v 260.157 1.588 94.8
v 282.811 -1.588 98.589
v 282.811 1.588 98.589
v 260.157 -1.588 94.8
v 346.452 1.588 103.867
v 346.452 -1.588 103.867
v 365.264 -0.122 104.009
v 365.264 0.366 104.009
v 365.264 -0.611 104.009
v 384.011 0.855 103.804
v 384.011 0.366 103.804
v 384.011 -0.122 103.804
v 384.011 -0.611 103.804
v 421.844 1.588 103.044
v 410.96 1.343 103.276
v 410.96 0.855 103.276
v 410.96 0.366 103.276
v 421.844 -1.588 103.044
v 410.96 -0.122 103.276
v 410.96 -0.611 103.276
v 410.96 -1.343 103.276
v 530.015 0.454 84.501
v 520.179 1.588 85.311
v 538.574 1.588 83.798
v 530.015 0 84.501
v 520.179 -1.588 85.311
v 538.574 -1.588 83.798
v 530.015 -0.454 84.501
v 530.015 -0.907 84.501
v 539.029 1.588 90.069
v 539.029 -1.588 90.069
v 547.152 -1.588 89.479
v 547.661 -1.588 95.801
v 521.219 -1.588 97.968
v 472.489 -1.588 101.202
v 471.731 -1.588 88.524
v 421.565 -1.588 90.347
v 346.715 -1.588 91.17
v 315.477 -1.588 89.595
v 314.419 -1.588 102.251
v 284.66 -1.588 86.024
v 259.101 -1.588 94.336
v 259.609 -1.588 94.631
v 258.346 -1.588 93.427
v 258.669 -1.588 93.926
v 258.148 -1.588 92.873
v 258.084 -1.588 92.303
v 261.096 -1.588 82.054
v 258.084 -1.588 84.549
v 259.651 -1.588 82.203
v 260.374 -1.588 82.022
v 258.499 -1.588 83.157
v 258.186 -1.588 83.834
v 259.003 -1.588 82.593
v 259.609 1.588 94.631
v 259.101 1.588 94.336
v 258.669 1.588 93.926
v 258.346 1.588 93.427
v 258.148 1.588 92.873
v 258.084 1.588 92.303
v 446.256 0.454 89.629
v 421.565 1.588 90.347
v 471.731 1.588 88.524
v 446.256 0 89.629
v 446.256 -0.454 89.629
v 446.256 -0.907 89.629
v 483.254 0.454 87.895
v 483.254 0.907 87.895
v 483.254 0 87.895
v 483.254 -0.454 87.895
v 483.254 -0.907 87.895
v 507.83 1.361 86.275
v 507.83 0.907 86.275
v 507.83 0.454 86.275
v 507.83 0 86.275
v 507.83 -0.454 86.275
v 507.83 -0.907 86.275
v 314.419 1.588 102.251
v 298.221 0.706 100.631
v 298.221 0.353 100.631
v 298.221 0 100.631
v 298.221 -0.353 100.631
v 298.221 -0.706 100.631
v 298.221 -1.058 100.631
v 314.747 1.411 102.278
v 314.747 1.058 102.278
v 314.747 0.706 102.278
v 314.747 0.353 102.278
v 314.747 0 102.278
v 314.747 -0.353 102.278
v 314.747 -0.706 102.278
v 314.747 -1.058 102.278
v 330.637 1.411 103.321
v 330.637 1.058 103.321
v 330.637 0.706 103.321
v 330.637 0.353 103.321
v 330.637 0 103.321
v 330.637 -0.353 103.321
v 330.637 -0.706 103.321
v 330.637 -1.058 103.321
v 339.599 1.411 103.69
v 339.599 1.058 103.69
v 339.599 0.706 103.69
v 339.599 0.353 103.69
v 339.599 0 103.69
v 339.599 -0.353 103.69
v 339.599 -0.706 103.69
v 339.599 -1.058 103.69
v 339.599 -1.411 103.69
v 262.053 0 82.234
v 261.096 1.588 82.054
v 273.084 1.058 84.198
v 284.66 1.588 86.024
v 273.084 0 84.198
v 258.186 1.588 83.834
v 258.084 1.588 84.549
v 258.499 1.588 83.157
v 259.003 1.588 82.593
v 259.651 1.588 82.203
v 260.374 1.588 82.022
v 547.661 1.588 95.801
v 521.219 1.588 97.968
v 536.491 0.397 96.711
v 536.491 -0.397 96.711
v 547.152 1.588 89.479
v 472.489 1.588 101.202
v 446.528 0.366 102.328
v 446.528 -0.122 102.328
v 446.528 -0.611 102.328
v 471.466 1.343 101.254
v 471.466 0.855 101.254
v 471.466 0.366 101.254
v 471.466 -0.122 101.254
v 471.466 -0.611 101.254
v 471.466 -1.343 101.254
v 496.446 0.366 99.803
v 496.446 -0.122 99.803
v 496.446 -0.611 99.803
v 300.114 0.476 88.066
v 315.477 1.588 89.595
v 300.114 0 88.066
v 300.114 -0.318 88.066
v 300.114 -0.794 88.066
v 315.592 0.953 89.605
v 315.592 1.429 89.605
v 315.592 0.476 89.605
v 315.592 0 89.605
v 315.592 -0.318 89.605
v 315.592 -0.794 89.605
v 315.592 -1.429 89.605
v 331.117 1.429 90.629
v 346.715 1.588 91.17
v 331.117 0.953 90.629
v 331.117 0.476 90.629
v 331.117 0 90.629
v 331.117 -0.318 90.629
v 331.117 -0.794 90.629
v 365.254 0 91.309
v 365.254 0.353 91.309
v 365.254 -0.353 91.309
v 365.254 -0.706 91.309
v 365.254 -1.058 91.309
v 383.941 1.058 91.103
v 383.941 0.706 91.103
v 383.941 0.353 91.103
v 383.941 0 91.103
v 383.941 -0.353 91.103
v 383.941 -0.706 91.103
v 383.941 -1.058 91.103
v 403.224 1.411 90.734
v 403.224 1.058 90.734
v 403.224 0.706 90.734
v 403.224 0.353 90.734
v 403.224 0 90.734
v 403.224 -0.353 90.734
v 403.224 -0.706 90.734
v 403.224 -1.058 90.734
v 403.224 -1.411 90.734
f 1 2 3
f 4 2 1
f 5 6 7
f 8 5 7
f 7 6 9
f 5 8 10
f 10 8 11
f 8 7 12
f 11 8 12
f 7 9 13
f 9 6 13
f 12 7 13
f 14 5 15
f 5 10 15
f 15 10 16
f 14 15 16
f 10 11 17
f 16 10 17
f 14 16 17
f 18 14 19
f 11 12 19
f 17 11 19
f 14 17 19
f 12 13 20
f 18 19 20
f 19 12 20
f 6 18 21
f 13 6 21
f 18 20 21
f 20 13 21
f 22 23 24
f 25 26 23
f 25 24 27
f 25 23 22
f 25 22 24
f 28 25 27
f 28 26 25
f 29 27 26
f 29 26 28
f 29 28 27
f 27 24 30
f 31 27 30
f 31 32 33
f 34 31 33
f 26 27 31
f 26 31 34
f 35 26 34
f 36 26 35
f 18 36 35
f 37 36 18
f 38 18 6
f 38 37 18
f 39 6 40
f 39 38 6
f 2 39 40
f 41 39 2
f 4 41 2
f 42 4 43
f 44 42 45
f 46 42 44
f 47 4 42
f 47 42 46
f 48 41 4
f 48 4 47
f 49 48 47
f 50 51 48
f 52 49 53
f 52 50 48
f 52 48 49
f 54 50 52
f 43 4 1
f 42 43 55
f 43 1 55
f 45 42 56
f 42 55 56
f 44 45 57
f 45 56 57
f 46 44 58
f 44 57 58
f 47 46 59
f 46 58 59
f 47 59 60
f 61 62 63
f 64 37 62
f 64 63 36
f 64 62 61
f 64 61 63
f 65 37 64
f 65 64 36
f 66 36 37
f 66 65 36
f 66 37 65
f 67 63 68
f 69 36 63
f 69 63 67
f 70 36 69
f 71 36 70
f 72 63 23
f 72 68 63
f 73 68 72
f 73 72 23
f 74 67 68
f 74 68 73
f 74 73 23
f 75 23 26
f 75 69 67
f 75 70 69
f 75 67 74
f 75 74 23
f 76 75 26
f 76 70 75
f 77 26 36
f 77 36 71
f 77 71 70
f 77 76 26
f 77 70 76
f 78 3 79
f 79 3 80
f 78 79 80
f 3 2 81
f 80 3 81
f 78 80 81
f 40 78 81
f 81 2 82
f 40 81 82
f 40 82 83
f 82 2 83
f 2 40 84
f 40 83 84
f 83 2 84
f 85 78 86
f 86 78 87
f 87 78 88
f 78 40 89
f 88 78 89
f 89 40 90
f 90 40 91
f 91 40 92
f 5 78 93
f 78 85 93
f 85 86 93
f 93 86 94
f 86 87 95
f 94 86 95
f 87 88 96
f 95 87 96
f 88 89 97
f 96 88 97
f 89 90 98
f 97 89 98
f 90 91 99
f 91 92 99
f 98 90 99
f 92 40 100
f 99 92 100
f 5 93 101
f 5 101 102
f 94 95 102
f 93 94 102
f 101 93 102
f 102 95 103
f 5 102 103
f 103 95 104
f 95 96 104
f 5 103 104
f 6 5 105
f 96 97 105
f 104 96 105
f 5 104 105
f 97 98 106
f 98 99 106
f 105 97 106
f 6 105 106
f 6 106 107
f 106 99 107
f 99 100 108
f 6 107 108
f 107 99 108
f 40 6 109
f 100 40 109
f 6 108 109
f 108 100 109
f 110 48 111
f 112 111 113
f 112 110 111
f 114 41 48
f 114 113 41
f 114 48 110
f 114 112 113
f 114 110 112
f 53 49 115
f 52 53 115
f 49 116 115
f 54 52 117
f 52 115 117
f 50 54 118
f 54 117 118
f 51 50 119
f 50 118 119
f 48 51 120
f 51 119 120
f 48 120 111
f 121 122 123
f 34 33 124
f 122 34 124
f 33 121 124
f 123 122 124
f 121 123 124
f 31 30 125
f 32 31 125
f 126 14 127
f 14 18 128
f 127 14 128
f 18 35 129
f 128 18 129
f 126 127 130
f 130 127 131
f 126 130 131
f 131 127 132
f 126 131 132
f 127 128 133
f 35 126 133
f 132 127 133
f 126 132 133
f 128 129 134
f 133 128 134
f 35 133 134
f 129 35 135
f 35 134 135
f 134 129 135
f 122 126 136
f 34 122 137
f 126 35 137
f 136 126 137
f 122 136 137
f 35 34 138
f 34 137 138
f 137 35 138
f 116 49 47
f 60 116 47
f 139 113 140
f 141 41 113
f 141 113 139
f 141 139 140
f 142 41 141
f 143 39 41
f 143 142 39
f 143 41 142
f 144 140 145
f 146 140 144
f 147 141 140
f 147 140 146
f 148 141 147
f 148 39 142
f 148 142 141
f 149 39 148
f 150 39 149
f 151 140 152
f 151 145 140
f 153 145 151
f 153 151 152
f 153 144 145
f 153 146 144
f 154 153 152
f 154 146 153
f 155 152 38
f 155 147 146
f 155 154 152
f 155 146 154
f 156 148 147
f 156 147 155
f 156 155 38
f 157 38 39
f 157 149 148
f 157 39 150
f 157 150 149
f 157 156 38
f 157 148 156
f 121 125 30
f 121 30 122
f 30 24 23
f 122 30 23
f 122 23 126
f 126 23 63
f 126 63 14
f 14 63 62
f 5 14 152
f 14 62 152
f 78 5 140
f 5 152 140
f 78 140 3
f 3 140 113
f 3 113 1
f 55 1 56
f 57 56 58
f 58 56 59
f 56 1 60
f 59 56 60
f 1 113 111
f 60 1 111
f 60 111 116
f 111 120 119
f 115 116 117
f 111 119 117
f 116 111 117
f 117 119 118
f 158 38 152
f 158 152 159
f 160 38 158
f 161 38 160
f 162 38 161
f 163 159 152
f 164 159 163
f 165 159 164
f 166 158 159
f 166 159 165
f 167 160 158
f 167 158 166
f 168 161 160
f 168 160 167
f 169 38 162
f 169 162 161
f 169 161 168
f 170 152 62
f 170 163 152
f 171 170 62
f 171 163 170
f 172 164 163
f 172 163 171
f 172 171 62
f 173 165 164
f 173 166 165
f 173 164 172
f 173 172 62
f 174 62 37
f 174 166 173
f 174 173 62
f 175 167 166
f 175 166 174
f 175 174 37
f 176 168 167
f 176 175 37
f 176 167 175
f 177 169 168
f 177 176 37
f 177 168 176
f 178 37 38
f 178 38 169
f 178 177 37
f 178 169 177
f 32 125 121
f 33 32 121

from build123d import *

# Parameters (mm, degrees)
BOSS_EXTRUDE1_START = -1.5875
BOSS_EXTRUDE1_DEPTH = 3.175
FILLET1_R           = 2.54
CUT_EXTRUDE1_DEPTH  = 10.16


# Read off the part's stored shape, not the designer's step: Boss-Extrude1
with BuildPart() as part:
    # Boss-Extrude1 outline → Boss-Extrude1 (new body)
    with BuildSketch(Plane(origin=(0, 0, 0), x_dir=(1, 0, 0), z_dir=(0, 1, 0)).offset(BOSS_EXTRUDE1_START)):
        with BuildLine():
            add(Edge.make_bspline(
                [(701.573370465, -71.674259434), (702.04697488, -71.626796619), (702.961854911, -71.534187022), (704.527211696, -71.372087014), (706.256268563, -71.189411511), (708.433468196, -70.954566837), (711.038260137, -70.66442021), (715.259153852, -70.176918919), (720.517449562, -69.537326192), (728.939784684, -68.449094171), (739.471043309, -66.973596397), (752.121699379, -65.058370184), (764.774270693, -63.022725712), (775.332382372, -61.245644149), (783.768221701, -59.789793136), (790.217423582, -58.659365862), (795.556531692, -57.710632329), (799.706029598, -56.965839367), (801.743713725, -56.597532565), (802.76701547, -56.411910209)],
                knots=[1.1996e-05, 1.1996e-05, 1.1996e-05, 1.1996e-05, 0.015636808, 0.031261621, 0.046886433, 0.062511246, 0.093760871, 0.125010496, 0.187509746, 0.250008997, 0.375007497, 0.500005998, 0.625004498, 0.750002999, 0.812502249, 0.875001499, 0.93750075, 0.968750375, 1, 1, 1, 1], degree=3))
            add(Edge.make_bspline(
                [(696.057912544, -72.218303811), (696.516819195, -72.173843609), (697.434189716, -72.08448281), (698.812500771, -71.948951554), (700.191895387, -71.812223809), (701.113019016, -71.720314305), (701.573370465, -71.674259434)],
                knots=[0.000436824, 0.000436824, 0.000436824, 0.000436824, 0.250279009, 0.500121194, 0.749963378, 0.999805563, 0.999805563, 0.999805563, 0.999805563], degree=3))
            add(Edge.make_bspline(
                [(684.465771861, -73.258588893), (685.427037387, -73.178353817), (687.338409796, -73.01607439), (690.270265001, -72.757917882), (693.135698373, -72.496722872), (695.087462196, -72.311946881), (696.057912544, -72.218303811)],
                knots=[-3.996e-06, -3.996e-06, -3.996e-06, -3.996e-06, 0.249945754, 0.499895504, 0.749845254, 0.999795004, 0.999795004, 0.999795004, 0.999795004], degree=3))
            add(Edge.make_bspline(
                [(602.42420841, -79.030202072), (604.074214061, -78.917973041), (607.327656264, -78.697993222), (612.488020924, -78.352754528), (617.82142797, -77.998720132), (624.748165187, -77.541006681), (633.288768179, -76.978079707), (643.562499486, -76.293021789), (653.811394813, -75.590339748), (662.341271598, -74.981221252), (669.157253218, -74.473896148), (673.963588211, -74.106706625), (678.141033863, -73.776630779), (681.719672317, -73.486306526), (683.554235836, -73.334679882), (684.465771861, -73.258588893)],
                knots=[4.679e-06, 4.679e-06, 4.679e-06, 4.679e-06, 0.062504419, 0.125004159, 0.1875039, 0.25000364, 0.375003121, 0.500002601, 0.625002082, 0.750001563, 0.812501303, 0.875001043, 0.937500783, 0.968750654, 1.000000524, 1.000000524, 1.000000524, 1.000000524], degree=3))
            add(Edge.make_bspline(
                [(520.17866376, -85.310815783), (520.948622537, -85.247475703), (522.472990474, -85.121954498), (525.646023872, -84.860432492), (529.954540392, -84.505420462), (535.485636827, -84.050761487), (540.7029418, -83.623505808), (545.828810606, -83.207047886), (550.972711882, -82.793890253), (556.116782859, -82.386921041), (562.976897794, -81.853433898), (571.571389273, -81.203899916), (581.568137842, -80.474939815), (590.024015055, -79.880194977), (597.052441707, -79.396103056), (600.639671821, -79.151478022), (602.42420841, -79.030202072)],
                knots=[1.3823e-05, 1.3823e-05, 1.3823e-05, 1.3823e-05, 0.031263258, 0.062512694, 0.125011564, 0.187510435, 0.250009305, 0.312508176, 0.375007046, 0.437505917, 0.500004787, 0.625002528, 0.750000269, 0.87499801, 0.937496881, 0.999995751, 0.999995751, 0.999995751, 0.999995751], degree=3))
            add(Edge.make_bspline(
                [(421.564796931, -90.347249187), (422.61109619, -90.324190198), (424.721066812, -90.275643156), (427.781390104, -90.199626606), (430.822063258, -90.118782847), (434.941029322, -90.002532976), (440.08484045, -89.844168641), (452.427619866, -89.421521336), (466.822115937, -88.804267378), (483.25535308, -87.910089241), (493.52068453, -87.276342604), (501.726177762, -86.718361924), (507.872215251, -86.275368153), (512.780927318, -85.902800926), (516.950869137, -85.573515025), (519.108912611, -85.398645627), (520.17866376, -85.310815783)],
                knots=[7.203e-06, 7.203e-06, 7.203e-06, 7.203e-06, 0.031256675, 0.062506146, 0.093755618, 0.125005089, 0.187504032, 0.250002975, 0.499998747, 0.624996633, 0.749994519, 0.812493462, 0.874992405, 0.937491348, 0.968740819, 0.999990291, 0.999990291, 0.999990291, 0.999990291], degree=3))
            add(Edge.make_bspline(
                [(346.714675087, -91.169822314), (347.184634959, -91.179549272), (348.149283989, -91.198362445), (349.881001429, -91.228640124), (351.370820969, -91.250109563), (353.638345707, -91.276445536), (356.741777131, -91.30289862), (360.603346067, -91.318288447), (365.253131479, -91.312388009), (369.910166762, -91.284169995), (376.135587827, -91.222367993), (383.937832745, -91.109503558), (391.757720532, -90.96544109), (398.23665113, -90.836219907), (403.230594411, -90.734014325), (408.182903858, -90.630969164), (412.914025095, -90.531986169), (416.611599734, -90.454119205), (419.474951766, -90.392792196), (420.864689854, -90.36259776), (421.564796931, -90.347249187)],
                knots=[1.1e-08, 1.1e-08, 1.1e-08, 1.1e-08, 0.015624829, 0.031249657, 0.062499315, 0.093748972, 0.12499863, 0.187497945, 0.24999726, 0.312496575, 0.37499589, 0.49999452, 0.62499315, 0.687492464, 0.749991779, 0.812491094, 0.874990409, 0.937489724, 0.968739382, 0.999989039, 0.999989039, 0.999989039, 0.999989039], degree=3))
            add(Edge.make_bspline(
                [(284.660180705, -86.02436228), (285.273667186, -86.114656759), (286.466569449, -86.288293963), (288.463107874, -86.571590524), (290.46491743, -86.848444068), (293.02699573, -87.19252046), (296.252166304, -87.606710304), (301.400962421, -88.226261718), (307.844767088, -88.921476193), (315.590478493, -89.626291032), (322.05207179, -90.106744711), (327.225920355, -90.425587153), (330.470644664, -90.599377294), (333.059733967, -90.723413499), (335.02192621, -90.809363102), (336.835778016, -90.883623075), (338.1694462, -90.935956115), (339.489700776, -90.98142965), (341.397886756, -91.039617592), (343.443225624, -91.094945655), (345.255837503, -91.138480537), (346.23440638, -91.159881953), (346.714675087, -91.169822314)],
                knots=[0, 0, 0, 0, 0.03125, 0.0625, 0.09375, 0.125, 0.1875, 0.25, 0.375, 0.5, 0.625, 0.6875, 0.75, 0.78125, 0.8125, 0.84375, 0.875, 0.90625, 0.9375, 0.96875, 0.984375, 1, 1, 1, 1], degree=3))
            add(Edge.make_bspline(
                [(258.083552795, -81.475395447), (258.347968296, -81.526862936), (258.876883054, -81.629439687), (259.670508063, -81.782232521), (260.729004783, -81.984533344), (265.19336261, -82.828339408), (273.252215122, -84.264018509), (280.795301047, -85.455519597), (284.660180705, -86.02436228)],
                knots=[0.425011658, 0.425011658, 0.425011658, 0.425011658, 0.442241189, 0.459470721, 0.476700252, 0.511159315, 0.75, 1, 1, 1, 1], degree=3))
            Line((258.083552795, -81.475395447), (258.083552795, -94.40861288))
            add(Edge.make_bspline(
                [(282.810885884, -98.588999508), (274.906267762, -97.425577983), (267.032082315, -96.096692803), (258.818160589, -94.548151889), (258.450825612, -94.478551371), (258.083552795, -94.40861288)],
                knots=[0, 0, 0, 0, 0.5, 0.5, 0.523411439, 0.523411439, 0.523411439, 0.523411439], degree=3))
            add(Edge.make_bspline(
                [(282.810885884, -98.588999508), (283.589001764, -98.703524555), (285.164508504, -98.932181064), (287.829592849, -99.306686744), (290.382113422, -99.652796041), (292.96654593, -99.989964246), (295.582618612, -100.317621114), (298.230083081, -100.634886778), (300.908649594, -100.941019762), (303.61800528, -101.235303734), (306.357810596, -101.517085869), (309.127700691, -101.785780175), (311.92729165, -102.040857239), (316.290106771, -102.412643883), (322.527800913, -102.877083333), (328.625603501, -103.227822262), (333.380129051, -103.452212237), (336.816790701, -103.594408746), (339.260438836, -103.686034081), (343.688375923, -103.809905452), (346.451873128, -103.867102934)],
                knots=[0, 0, 0, 0, 0.039344948, 0.07917436, 0.119484401, 0.160271019, 0.201529957, 0.243256752, 0.285446746, 0.328095093, 0.37119677, 0.414746584, 0.458739194, 0.503169123, 0.620303495, 0.752369719, 0.789892337, 0.843756099, 0.913843268, 1, 1, 1, 1], degree=3))
            add(Edge.make_bspline(
                [(346.451873128, -103.867102934), (347.517721695, -103.889163254), (349.542313965, -103.92559437), (351.410670783, -103.951601003), (353.733077388, -103.97802022), (356.595805361, -104.001616052), (359.303450326, -104.013254143), (361.856652408, -104.015647305), (363.59855953, -104.013876583), (367.980988834, -104.00146953), (374.772600805, -103.943346872), (385.553908564, -103.787153573), (397.279033824, -103.561287268), (410.957604412, -103.27591363), (418.412993695, -103.119398813), (421.843885938, -103.044182276)],
                knots=[0, 0, 0, 0, 0.033933195, 0.066295354, 0.097094988, 0.12634023, 0.180197875, 0.204824218, 0.227923989, 0.249502809, 0.379187752, 0.498147003, 0.678500622, 0.845778388, 1, 1, 1, 1], degree=3))
            add(Edge.make_bspline(
                [(421.843885938, -103.044182276), (423.284501257, -103.01243375), (426.138074601, -102.945774905), (430.23392379, -102.840101392), (434.371968877, -102.72425222), (439.798819101, -102.559925422), (448.025157593, -102.283759658), (459.021003941, -101.848637215), (471.45249354, -101.271082202), (483.913686147, -100.593406887), (494.231772367, -99.956980278), (502.466387344, -99.39745886), (508.578998405, -98.957752379), (514.573610191, -98.503827918), (518.958126171, -98.153760061), (521.218891036, -97.968142841)],
                knots=[0, 0, 0, 0, 0.042442699, 0.084473439, 0.126075796, 0.167232557, 0.248140272, 0.374197286, 0.498957981, 0.623287397, 0.750390596, 0.810583593, 0.872090979, 0.935130561, 1, 1, 1, 1], degree=3))
            add(Edge.make_bspline(
                [(521.218891036, -97.968142841), (523.451350188, -97.784491424), (528.137879673, -97.397889698), (536.731309482, -96.690817555), (544.954460679, -96.018267543), (553.50407331, -95.33057133), (563.716480518, -94.531063336), (575.636513939, -93.635190253), (588.786212869, -92.692538058), (598.347131864, -92.036570917), (603.285671904, -91.700951094)],
                knots=[0, 0, 0, 0, 0.091538543, 0.187736577, 0.288050862, 0.392265043, 0.500367872, 0.66142166, 0.827962884, 1, 1, 1, 1], degree=3))
            add(Edge.make_bspline(
                [(603.285671904, -91.700951094), (605.78808228, -91.530743591), (610.897032353, -91.186403467), (619.306599861, -90.627823918), (627.538601032, -90.084789882), (635.936476676, -89.530098998), (643.719546666, -89.009847824), (650.893783861, -88.520535985), (657.46530725, -88.061941255), (664.220349455, -87.576914876), (671.158631923, -87.060362733), (677.768426526, -86.549575155), (682.892578542, -86.13408317), (685.522190682, -85.9145748)],
                knots=[0, 0, 0, 0, 0.096041268, 0.194096291, 0.29416615, 0.396252661, 0.500358628, 0.578021943, 0.657927659, 0.740076076, 0.824468696, 0.911108458, 1, 1, 1, 1], degree=3))
            add(Edge.make_bspline(
                [(685.522190682, -85.9145748), (686.483363358, -85.834347474), (688.416317483, -85.670266195), (691.375399642, -85.409794673), (694.295027309, -85.143745348), (696.281480154, -84.95572275), (697.280162315, -84.859352478)],
                knots=[0, 0, 0, 0, 0.247890437, 0.497182912, 0.747883707, 1, 1, 1, 1], degree=3))
            add(Edge.make_bspline(
                [(697.280162315, -84.859352478), (699.133498258, -84.679799353), (700.986276607, -84.496390936), (702.838684367, -84.311070025)],
                knots=[0, 0, 0, 0, 1, 1, 1, 1], degree=3))
            add(Edge.make_bspline(
                [(702.838684367, -84.311070025), (703.589775295, -84.235799752), (705.133492987, -84.078629058), (708.047466313, -83.771407142), (710.748991263, -83.476233306), (713.523455705, -83.162791229), (716.37085234, -82.830812164), (719.291149506, -82.479719712), (722.284334057, -82.109050619), (725.350396028, -81.718303946), (730.760173437, -81.009658613), (740.331799838, -79.683632118), (753.598097399, -77.68903736), (767.27468421, -75.481732644), (778.677358422, -73.559116698), (788.170711893, -71.915943965), (796.891357387, -70.375844053), (802.366731643, -69.391771369), (805.033747795, -68.907986576)],
                knots=[0, 0, 0, 0, 0.024848372, 0.050416521, 0.076704883, 0.103713975, 0.131444397, 0.159896834, 0.189072062, 0.218970945, 0.249594443, 0.347406526, 0.499390399, 0.638902952, 0.749436379, 0.834969029, 0.918499168, 1, 1, 1, 1], degree=3))
            Line((805.033747795, -68.907986576), (806.809551789, -68.578936168))
            add(Edge.make_bspline(
                [(806.809551789, -68.578936168), (807.794004822, -68.395119755), (809.726191369, -68.029713589), (811.766757719, -67.634799792), (814.185248792, -67.158567155), (816.55886725, -66.68111941), (820.369254046, -65.898841142), (824.807312319, -64.951185469), (829.827239229, -63.826217582), (833.268092373, -63.026324522), (835.935211118, -62.389425037), (837.873162846, -61.91853539), (839.769381429, -61.449895816), (841.624127129, -60.983575945), (843.734931971, -60.443149682), (844.733875611, -60.183258894), (845.223156672, -60.055102096)],
                knots=[0, 0, 0, 0, 0.064848776, 0.128591831, 0.191223632, 0.252742215, 0.313148507, 0.487734154, 0.598660779, 0.705288655, 0.75701083, 0.807682273, 0.85731034, 0.905901891, 0.953463218, 1, 1, 1, 1], degree=3))
            add(Edge.make_bspline(
                [(858.805970467, -56.257210913), (854.302265416, -57.602424975), (849.773135735, -58.863331563), (845.223156672, -60.055102096)],
                knots=[0.525572557, 0.525572557, 0.525572557, 0.525572557, 1, 1, 1, 1], degree=3))
            Line((858.805970467, -56.257210913), (858.805970467, -42.981654463))
            add(Edge.make_bspline(
                [(842.005216089, -47.769547229), (844.33209519, -47.160070589), (848.630876213, -45.996859499), (853.420502494, -44.614540459), (856.161610787, -43.791878163), (857.220661541, -43.470009626), (858.013965236, -43.226852548), (858.542087125, -43.063586295), (858.805970467, -42.981654463)],
                knots=[0, 0, 0, 0, 0.25, 0.462204418, 0.52007177, 0.549005446, 0.577939123, 0.606872799, 0.606872799, 0.606872799, 0.606872799], degree=3))
            add(Edge.make_bspline(
                [(804.478503109, -56.094697623), (804.937261418, -56.009038578), (805.873535899, -55.833158182), (807.593890186, -55.506511486), (809.223478159, -55.191529302), (811.577863033, -54.728351346), (814.728198308, -54.095426794), (818.65467417, -53.281335813), (823.355137668, -52.264852214), (828.043123472, -51.207419322), (831.9339187, -50.292144023), (835.047083584, -49.53591133), (836.970069876, -49.058975401), (838.551971708, -48.659746263), (839.885294081, -48.319263071), (841.0585054, -48.016793361), (841.676038434, -47.855768334), (842.005216089, -47.769547229)],
                knots=[0, 0, 0, 0, 0.03125, 0.0625, 0.125, 0.1875, 0.25, 0.375, 0.5, 0.625, 0.75, 0.8125, 0.875, 0.90625, 0.9375, 0.96875, 1, 1, 1, 1], degree=3))
            Line((804.478503109, -56.094697623), (802.76701547, -56.411910209))
        make_face()
    extrude(amount=BOSS_EXTRUDE1_DEPTH)

    # Fillet1
    fillet1_edges = [part.edges().sort_by_distance(p)[0] for p in [
        (858.805970467, 0, 42.981654463),
        (858.805970467, 0, 56.257210913),
        (258.083552795, 0, 81.475395447),
        (258.083552795, 0, 94.40861288),
    ]]
    fillet(fillet1_edges, radius=FILLET1_R)

    # Sketch3 → Cut-Extrude1 (cut)
    with BuildSketch(Plane(origin=(0, 1.5875, 0), x_dir=(1, 0, 0), z_dir=(0, 1, 0))):
        with BuildLine():
            Line((538.573908081, -83.797990994), (539.029351184, -90.069007907))
            Line((539.029351184, -90.069007907), (547.151700891, -89.47910866))
            Line((547.151700891, -89.47910866), (547.661463933, -95.801226886))
            add(Edge.make_bspline(
                [(547.661463933, -95.801226886), (549.573540603, -95.647052923), (554.442098815, -95.257135276), (563.716480518, -94.531063336), (575.636513939, -93.635190253), (588.786212869, -92.692538058), (598.347131864, -92.036570917), (603.285671904, -91.700951094)],
                knots=[0.322345551, 0.322345551, 0.322345551, 0.322345551, 0.392265043, 0.500367872, 0.66142166, 0.827962884, 1, 1, 1, 1], degree=3))
            add(Edge.make_bspline(
                [(603.285671904, -91.700951094), (605.78808228, -91.530743591), (610.897032353, -91.186403467), (619.306599861, -90.627823918), (627.538601032, -90.084789882), (635.936476676, -89.530098998), (643.719546666, -89.009847824), (650.893783861, -88.520535985), (657.46530725, -88.061941255), (664.220349455, -87.576914876), (671.158631923, -87.060362733), (677.768426526, -86.549575155), (682.892578542, -86.13408317), (685.522190682, -85.9145748)],
                knots=[0, 0, 0, 0, 0.096041268, 0.194096291, 0.29416615, 0.396252661, 0.500358628, 0.578021943, 0.657927659, 0.740076076, 0.824468696, 0.911108458, 1, 1, 1, 1], degree=3))
            add(Edge.make_bspline(
                [(685.522190682, -85.9145748), (686.483363358, -85.834347474), (688.416317483, -85.670266195), (691.375399642, -85.409794673), (694.295027309, -85.143745348), (696.281480154, -84.95572275), (697.280162315, -84.859352478)],
                knots=[0, 0, 0, 0, 0.247890437, 0.497182912, 0.747883707, 1, 1, 1, 1], degree=3))
            add(Edge.make_bspline(
                [(697.280162315, -84.859352478), (699.133498258, -84.679799353), (700.986276607, -84.496390936), (702.838684367, -84.311070025)],
                knots=[0, 0, 0, 0, 1, 1, 1, 1], degree=3))
            add(Edge.make_bspline(
                [(702.838684367, -84.311070025), (703.589775295, -84.235799752), (705.133492987, -84.078629058), (708.047466313, -83.771407142), (710.748991263, -83.476233306), (713.523455705, -83.162791229), (716.37085234, -82.830812164), (719.291149506, -82.479719712), (722.284334057, -82.109050619), (725.350396028, -81.718303946), (730.760173437, -81.009658613), (740.331799838, -79.683632118), (753.598097399, -77.68903736), (767.27468421, -75.481732644), (778.677358422, -73.559116698), (788.170711893, -71.915943965), (796.891357387, -70.375844053), (802.366731643, -69.391771369), (805.033747795, -68.907986576)],
                knots=[0, 0, 0, 0, 0.024848372, 0.050416521, 0.076704883, 0.103713975, 0.131444397, 0.159896834, 0.189072062, 0.218970945, 0.249594443, 0.347406526, 0.499390399, 0.638902952, 0.749436379, 0.834969029, 0.918499168, 1, 1, 1, 1], degree=3))
            Line((805.033747795, -68.907986576), (806.809551789, -68.578936168))
            add(Edge.make_bspline(
                [(806.809551789, -68.578936168), (807.794004822, -68.395119755), (809.726191369, -68.029713589), (811.766757719, -67.634799792), (814.185248792, -67.158567155), (816.55886725, -66.68111941), (820.369254046, -65.898841142), (824.807312319, -64.951185469), (829.827239229, -63.826217582), (833.268092373, -63.026324522), (835.935211118, -62.389425037), (837.873162846, -61.91853539), (839.769381429, -61.449895816), (841.624127129, -60.983575945), (843.734931971, -60.443149682), (844.733875611, -60.183258894), (845.223156672, -60.055102096)],
                knots=[0, 0, 0, 0, 0.064848776, 0.128591831, 0.191223632, 0.252742215, 0.313148507, 0.487734154, 0.598660779, 0.705288655, 0.75701083, 0.807682273, 0.85731034, 0.905901891, 0.953463218, 1, 1, 1, 1], degree=3))
            add(Edge.make_bspline(
                [(845.223156672, -60.055102096), (849.158938128, -59.024204428), (853.079119118, -57.941576123), (856.980738351, -56.797397641)],
                knots=[0.589615008, 0.589615008, 0.589615008, 0.589615008, 1, 1, 1, 1], degree=3))
            ThreePointArc((856.980738351, -56.797397641), (858.299078563, -55.882556759), (858.805970467, -54.360050704))
            Line((858.805970467, -54.360050704), (858.805970467, -46.412138384))
            ThreePointArc((858.805970467, -46.412138384), (857.782327313, -44.374428415), (855.536472895, -43.979149832))
            add(Edge.make_bspline(
                [(855.536472895, -43.979149832), (855.302707966, -44.049240975), (853.122392665, -44.700577003), (848.630876213, -45.996859499), (844.33209519, -47.160070589), (842.005216089, -47.769547229)],
                knots=[0, 0, 0, 0, 0.025497707, 0.237702124, 0.487702124, 0.487702124, 0.487702124, 0.487702124], degree=3))
            add(Edge.make_bspline(
                [(842.005216089, -47.769547229), (841.676038434, -47.855768334), (841.0585054, -48.016793361), (839.885294081, -48.319263071), (838.551971708, -48.659746263), (836.970069876, -49.058975401), (835.047083584, -49.53591133), (831.9339187, -50.292144023), (828.043123472, -51.207419322), (823.355137668, -52.264852214), (818.65467417, -53.281335813), (814.728198308, -54.095426794), (811.577863033, -54.728351346), (809.223478159, -55.191529302), (807.593890186, -55.506511486), (805.873535899, -55.833158182), (804.937261418, -56.009038578), (804.478503109, -56.094697623)],
                knots=[0, 0, 0, 0, 0.03125, 0.0625, 0.09375, 0.125, 0.1875, 0.25, 0.375, 0.5, 0.625, 0.75, 0.8125, 0.875, 0.9375, 0.96875, 1, 1, 1, 1], degree=3))
            Line((804.478503109, -56.094697623), (802.76701547, -56.411910209))
            add(Edge.make_bspline(
                [(802.76701547, -56.411910209), (801.743713725, -56.597532565), (799.706029598, -56.965839367), (795.556531692, -57.710632329), (790.217423582, -58.659365862), (783.768221701, -59.789793136), (775.332382372, -61.245644149), (764.774270693, -63.022725712), (752.121699379, -65.058370184), (739.471043309, -66.973596397), (728.939784684, -68.449094171), (720.517449562, -69.537326192), (715.259153852, -70.176918919), (711.038260137, -70.66442021), (708.433468196, -70.954566837), (706.256268563, -71.189411511), (704.527211696, -71.372087014), (702.961854911, -71.534187022), (702.04697488, -71.626796619), (701.573370465, -71.674259434)],
                knots=[1.1996e-05, 1.1996e-05, 1.1996e-05, 1.1996e-05, 0.031261621, 0.062511246, 0.125010496, 0.187509746, 0.250008997, 0.375007497, 0.500005998, 0.625004498, 0.750002999, 0.812502249, 0.875001499, 0.906251125, 0.93750075, 0.953125562, 0.968750375, 0.984375187, 1, 1, 1, 1], degree=3))
            add(Edge.make_bspline(
                [(701.573370465, -71.674259434), (701.113019016, -71.720314305), (700.191895387, -71.812223809), (698.812500771, -71.948951554), (697.434189716, -72.08448281), (696.516819195, -72.173843609), (696.057912544, -72.218303811)],
                knots=[0.000436824, 0.000436824, 0.000436824, 0.000436824, 0.250279009, 0.500121194, 0.749963378, 0.999805563, 0.999805563, 0.999805563, 0.999805563], degree=3))
            add(Edge.make_bspline(
                [(696.057912544, -72.218303811), (695.087462196, -72.311946881), (693.135698373, -72.496722872), (690.270265001, -72.757917882), (687.338409796, -73.01607439), (685.427037387, -73.178353817), (684.465771861, -73.258588893)],
                knots=[-3.996e-06, -3.996e-06, -3.996e-06, -3.996e-06, 0.249945754, 0.499895504, 0.749845254, 0.999795004, 0.999795004, 0.999795004, 0.999795004], degree=3))
            add(Edge.make_bspline(
                [(684.465771861, -73.258588893), (683.554235836, -73.334679882), (681.719672317, -73.486306526), (678.141033863, -73.776630779), (673.963588211, -74.106706625), (669.157253218, -74.473896148), (662.341271598, -74.981221252), (653.811394813, -75.590339748), (643.562499486, -76.293021789), (633.288768179, -76.978079707), (624.748165187, -77.541006681), (617.82142797, -77.998720132), (612.488020924, -78.352754528), (607.327656264, -78.697993222), (604.074214061, -78.917973041), (602.42420841, -79.030202072)],
                knots=[4.679e-06, 4.679e-06, 4.679e-06, 4.679e-06, 0.031254549, 0.062504419, 0.125004159, 0.1875039, 0.25000364, 0.375003121, 0.500002601, 0.625002082, 0.750001563, 0.812501303, 0.875001043, 0.937500783, 1.000000524, 1.000000524, 1.000000524, 1.000000524], degree=3))
            add(Edge.make_bspline(
                [(602.42420841, -79.030202072), (600.639671821, -79.151478022), (597.052441707, -79.396103056), (590.024015055, -79.880194977), (581.568137842, -80.474939815), (571.571389273, -81.203899916), (562.976897794, -81.853433898), (556.116782859, -82.386921041), (550.972711882, -82.793890253), (545.828810606, -83.207047886), (541.716519062, -83.541156396), (539.282690998, -83.740007149), (538.573908081, -83.797990994)],
                knots=[1.3823e-05, 1.3823e-05, 1.3823e-05, 1.3823e-05, 0.062512694, 0.125011564, 0.250009305, 0.375007046, 0.500004787, 0.562503658, 0.625002528, 0.687501399, 0.750000269, 0.775424, 0.775424, 0.775424, 0.775424], degree=3))
        make_face()
    extrude(amount=-CUT_EXTRUDE1_DEPTH, mode=Mode.SUBTRACT)


with BuildPart() as cut_extrude1_kept_piece:
    # of the separate pieces the step leaves, the one the design keeps (cut_extrude1_pieces_kept)
    add(part.part.solids().sort_by_distance((520.17866376, -1.5875, 85.310815783))[0])


solid = cut_extrude1_kept_piece.part
